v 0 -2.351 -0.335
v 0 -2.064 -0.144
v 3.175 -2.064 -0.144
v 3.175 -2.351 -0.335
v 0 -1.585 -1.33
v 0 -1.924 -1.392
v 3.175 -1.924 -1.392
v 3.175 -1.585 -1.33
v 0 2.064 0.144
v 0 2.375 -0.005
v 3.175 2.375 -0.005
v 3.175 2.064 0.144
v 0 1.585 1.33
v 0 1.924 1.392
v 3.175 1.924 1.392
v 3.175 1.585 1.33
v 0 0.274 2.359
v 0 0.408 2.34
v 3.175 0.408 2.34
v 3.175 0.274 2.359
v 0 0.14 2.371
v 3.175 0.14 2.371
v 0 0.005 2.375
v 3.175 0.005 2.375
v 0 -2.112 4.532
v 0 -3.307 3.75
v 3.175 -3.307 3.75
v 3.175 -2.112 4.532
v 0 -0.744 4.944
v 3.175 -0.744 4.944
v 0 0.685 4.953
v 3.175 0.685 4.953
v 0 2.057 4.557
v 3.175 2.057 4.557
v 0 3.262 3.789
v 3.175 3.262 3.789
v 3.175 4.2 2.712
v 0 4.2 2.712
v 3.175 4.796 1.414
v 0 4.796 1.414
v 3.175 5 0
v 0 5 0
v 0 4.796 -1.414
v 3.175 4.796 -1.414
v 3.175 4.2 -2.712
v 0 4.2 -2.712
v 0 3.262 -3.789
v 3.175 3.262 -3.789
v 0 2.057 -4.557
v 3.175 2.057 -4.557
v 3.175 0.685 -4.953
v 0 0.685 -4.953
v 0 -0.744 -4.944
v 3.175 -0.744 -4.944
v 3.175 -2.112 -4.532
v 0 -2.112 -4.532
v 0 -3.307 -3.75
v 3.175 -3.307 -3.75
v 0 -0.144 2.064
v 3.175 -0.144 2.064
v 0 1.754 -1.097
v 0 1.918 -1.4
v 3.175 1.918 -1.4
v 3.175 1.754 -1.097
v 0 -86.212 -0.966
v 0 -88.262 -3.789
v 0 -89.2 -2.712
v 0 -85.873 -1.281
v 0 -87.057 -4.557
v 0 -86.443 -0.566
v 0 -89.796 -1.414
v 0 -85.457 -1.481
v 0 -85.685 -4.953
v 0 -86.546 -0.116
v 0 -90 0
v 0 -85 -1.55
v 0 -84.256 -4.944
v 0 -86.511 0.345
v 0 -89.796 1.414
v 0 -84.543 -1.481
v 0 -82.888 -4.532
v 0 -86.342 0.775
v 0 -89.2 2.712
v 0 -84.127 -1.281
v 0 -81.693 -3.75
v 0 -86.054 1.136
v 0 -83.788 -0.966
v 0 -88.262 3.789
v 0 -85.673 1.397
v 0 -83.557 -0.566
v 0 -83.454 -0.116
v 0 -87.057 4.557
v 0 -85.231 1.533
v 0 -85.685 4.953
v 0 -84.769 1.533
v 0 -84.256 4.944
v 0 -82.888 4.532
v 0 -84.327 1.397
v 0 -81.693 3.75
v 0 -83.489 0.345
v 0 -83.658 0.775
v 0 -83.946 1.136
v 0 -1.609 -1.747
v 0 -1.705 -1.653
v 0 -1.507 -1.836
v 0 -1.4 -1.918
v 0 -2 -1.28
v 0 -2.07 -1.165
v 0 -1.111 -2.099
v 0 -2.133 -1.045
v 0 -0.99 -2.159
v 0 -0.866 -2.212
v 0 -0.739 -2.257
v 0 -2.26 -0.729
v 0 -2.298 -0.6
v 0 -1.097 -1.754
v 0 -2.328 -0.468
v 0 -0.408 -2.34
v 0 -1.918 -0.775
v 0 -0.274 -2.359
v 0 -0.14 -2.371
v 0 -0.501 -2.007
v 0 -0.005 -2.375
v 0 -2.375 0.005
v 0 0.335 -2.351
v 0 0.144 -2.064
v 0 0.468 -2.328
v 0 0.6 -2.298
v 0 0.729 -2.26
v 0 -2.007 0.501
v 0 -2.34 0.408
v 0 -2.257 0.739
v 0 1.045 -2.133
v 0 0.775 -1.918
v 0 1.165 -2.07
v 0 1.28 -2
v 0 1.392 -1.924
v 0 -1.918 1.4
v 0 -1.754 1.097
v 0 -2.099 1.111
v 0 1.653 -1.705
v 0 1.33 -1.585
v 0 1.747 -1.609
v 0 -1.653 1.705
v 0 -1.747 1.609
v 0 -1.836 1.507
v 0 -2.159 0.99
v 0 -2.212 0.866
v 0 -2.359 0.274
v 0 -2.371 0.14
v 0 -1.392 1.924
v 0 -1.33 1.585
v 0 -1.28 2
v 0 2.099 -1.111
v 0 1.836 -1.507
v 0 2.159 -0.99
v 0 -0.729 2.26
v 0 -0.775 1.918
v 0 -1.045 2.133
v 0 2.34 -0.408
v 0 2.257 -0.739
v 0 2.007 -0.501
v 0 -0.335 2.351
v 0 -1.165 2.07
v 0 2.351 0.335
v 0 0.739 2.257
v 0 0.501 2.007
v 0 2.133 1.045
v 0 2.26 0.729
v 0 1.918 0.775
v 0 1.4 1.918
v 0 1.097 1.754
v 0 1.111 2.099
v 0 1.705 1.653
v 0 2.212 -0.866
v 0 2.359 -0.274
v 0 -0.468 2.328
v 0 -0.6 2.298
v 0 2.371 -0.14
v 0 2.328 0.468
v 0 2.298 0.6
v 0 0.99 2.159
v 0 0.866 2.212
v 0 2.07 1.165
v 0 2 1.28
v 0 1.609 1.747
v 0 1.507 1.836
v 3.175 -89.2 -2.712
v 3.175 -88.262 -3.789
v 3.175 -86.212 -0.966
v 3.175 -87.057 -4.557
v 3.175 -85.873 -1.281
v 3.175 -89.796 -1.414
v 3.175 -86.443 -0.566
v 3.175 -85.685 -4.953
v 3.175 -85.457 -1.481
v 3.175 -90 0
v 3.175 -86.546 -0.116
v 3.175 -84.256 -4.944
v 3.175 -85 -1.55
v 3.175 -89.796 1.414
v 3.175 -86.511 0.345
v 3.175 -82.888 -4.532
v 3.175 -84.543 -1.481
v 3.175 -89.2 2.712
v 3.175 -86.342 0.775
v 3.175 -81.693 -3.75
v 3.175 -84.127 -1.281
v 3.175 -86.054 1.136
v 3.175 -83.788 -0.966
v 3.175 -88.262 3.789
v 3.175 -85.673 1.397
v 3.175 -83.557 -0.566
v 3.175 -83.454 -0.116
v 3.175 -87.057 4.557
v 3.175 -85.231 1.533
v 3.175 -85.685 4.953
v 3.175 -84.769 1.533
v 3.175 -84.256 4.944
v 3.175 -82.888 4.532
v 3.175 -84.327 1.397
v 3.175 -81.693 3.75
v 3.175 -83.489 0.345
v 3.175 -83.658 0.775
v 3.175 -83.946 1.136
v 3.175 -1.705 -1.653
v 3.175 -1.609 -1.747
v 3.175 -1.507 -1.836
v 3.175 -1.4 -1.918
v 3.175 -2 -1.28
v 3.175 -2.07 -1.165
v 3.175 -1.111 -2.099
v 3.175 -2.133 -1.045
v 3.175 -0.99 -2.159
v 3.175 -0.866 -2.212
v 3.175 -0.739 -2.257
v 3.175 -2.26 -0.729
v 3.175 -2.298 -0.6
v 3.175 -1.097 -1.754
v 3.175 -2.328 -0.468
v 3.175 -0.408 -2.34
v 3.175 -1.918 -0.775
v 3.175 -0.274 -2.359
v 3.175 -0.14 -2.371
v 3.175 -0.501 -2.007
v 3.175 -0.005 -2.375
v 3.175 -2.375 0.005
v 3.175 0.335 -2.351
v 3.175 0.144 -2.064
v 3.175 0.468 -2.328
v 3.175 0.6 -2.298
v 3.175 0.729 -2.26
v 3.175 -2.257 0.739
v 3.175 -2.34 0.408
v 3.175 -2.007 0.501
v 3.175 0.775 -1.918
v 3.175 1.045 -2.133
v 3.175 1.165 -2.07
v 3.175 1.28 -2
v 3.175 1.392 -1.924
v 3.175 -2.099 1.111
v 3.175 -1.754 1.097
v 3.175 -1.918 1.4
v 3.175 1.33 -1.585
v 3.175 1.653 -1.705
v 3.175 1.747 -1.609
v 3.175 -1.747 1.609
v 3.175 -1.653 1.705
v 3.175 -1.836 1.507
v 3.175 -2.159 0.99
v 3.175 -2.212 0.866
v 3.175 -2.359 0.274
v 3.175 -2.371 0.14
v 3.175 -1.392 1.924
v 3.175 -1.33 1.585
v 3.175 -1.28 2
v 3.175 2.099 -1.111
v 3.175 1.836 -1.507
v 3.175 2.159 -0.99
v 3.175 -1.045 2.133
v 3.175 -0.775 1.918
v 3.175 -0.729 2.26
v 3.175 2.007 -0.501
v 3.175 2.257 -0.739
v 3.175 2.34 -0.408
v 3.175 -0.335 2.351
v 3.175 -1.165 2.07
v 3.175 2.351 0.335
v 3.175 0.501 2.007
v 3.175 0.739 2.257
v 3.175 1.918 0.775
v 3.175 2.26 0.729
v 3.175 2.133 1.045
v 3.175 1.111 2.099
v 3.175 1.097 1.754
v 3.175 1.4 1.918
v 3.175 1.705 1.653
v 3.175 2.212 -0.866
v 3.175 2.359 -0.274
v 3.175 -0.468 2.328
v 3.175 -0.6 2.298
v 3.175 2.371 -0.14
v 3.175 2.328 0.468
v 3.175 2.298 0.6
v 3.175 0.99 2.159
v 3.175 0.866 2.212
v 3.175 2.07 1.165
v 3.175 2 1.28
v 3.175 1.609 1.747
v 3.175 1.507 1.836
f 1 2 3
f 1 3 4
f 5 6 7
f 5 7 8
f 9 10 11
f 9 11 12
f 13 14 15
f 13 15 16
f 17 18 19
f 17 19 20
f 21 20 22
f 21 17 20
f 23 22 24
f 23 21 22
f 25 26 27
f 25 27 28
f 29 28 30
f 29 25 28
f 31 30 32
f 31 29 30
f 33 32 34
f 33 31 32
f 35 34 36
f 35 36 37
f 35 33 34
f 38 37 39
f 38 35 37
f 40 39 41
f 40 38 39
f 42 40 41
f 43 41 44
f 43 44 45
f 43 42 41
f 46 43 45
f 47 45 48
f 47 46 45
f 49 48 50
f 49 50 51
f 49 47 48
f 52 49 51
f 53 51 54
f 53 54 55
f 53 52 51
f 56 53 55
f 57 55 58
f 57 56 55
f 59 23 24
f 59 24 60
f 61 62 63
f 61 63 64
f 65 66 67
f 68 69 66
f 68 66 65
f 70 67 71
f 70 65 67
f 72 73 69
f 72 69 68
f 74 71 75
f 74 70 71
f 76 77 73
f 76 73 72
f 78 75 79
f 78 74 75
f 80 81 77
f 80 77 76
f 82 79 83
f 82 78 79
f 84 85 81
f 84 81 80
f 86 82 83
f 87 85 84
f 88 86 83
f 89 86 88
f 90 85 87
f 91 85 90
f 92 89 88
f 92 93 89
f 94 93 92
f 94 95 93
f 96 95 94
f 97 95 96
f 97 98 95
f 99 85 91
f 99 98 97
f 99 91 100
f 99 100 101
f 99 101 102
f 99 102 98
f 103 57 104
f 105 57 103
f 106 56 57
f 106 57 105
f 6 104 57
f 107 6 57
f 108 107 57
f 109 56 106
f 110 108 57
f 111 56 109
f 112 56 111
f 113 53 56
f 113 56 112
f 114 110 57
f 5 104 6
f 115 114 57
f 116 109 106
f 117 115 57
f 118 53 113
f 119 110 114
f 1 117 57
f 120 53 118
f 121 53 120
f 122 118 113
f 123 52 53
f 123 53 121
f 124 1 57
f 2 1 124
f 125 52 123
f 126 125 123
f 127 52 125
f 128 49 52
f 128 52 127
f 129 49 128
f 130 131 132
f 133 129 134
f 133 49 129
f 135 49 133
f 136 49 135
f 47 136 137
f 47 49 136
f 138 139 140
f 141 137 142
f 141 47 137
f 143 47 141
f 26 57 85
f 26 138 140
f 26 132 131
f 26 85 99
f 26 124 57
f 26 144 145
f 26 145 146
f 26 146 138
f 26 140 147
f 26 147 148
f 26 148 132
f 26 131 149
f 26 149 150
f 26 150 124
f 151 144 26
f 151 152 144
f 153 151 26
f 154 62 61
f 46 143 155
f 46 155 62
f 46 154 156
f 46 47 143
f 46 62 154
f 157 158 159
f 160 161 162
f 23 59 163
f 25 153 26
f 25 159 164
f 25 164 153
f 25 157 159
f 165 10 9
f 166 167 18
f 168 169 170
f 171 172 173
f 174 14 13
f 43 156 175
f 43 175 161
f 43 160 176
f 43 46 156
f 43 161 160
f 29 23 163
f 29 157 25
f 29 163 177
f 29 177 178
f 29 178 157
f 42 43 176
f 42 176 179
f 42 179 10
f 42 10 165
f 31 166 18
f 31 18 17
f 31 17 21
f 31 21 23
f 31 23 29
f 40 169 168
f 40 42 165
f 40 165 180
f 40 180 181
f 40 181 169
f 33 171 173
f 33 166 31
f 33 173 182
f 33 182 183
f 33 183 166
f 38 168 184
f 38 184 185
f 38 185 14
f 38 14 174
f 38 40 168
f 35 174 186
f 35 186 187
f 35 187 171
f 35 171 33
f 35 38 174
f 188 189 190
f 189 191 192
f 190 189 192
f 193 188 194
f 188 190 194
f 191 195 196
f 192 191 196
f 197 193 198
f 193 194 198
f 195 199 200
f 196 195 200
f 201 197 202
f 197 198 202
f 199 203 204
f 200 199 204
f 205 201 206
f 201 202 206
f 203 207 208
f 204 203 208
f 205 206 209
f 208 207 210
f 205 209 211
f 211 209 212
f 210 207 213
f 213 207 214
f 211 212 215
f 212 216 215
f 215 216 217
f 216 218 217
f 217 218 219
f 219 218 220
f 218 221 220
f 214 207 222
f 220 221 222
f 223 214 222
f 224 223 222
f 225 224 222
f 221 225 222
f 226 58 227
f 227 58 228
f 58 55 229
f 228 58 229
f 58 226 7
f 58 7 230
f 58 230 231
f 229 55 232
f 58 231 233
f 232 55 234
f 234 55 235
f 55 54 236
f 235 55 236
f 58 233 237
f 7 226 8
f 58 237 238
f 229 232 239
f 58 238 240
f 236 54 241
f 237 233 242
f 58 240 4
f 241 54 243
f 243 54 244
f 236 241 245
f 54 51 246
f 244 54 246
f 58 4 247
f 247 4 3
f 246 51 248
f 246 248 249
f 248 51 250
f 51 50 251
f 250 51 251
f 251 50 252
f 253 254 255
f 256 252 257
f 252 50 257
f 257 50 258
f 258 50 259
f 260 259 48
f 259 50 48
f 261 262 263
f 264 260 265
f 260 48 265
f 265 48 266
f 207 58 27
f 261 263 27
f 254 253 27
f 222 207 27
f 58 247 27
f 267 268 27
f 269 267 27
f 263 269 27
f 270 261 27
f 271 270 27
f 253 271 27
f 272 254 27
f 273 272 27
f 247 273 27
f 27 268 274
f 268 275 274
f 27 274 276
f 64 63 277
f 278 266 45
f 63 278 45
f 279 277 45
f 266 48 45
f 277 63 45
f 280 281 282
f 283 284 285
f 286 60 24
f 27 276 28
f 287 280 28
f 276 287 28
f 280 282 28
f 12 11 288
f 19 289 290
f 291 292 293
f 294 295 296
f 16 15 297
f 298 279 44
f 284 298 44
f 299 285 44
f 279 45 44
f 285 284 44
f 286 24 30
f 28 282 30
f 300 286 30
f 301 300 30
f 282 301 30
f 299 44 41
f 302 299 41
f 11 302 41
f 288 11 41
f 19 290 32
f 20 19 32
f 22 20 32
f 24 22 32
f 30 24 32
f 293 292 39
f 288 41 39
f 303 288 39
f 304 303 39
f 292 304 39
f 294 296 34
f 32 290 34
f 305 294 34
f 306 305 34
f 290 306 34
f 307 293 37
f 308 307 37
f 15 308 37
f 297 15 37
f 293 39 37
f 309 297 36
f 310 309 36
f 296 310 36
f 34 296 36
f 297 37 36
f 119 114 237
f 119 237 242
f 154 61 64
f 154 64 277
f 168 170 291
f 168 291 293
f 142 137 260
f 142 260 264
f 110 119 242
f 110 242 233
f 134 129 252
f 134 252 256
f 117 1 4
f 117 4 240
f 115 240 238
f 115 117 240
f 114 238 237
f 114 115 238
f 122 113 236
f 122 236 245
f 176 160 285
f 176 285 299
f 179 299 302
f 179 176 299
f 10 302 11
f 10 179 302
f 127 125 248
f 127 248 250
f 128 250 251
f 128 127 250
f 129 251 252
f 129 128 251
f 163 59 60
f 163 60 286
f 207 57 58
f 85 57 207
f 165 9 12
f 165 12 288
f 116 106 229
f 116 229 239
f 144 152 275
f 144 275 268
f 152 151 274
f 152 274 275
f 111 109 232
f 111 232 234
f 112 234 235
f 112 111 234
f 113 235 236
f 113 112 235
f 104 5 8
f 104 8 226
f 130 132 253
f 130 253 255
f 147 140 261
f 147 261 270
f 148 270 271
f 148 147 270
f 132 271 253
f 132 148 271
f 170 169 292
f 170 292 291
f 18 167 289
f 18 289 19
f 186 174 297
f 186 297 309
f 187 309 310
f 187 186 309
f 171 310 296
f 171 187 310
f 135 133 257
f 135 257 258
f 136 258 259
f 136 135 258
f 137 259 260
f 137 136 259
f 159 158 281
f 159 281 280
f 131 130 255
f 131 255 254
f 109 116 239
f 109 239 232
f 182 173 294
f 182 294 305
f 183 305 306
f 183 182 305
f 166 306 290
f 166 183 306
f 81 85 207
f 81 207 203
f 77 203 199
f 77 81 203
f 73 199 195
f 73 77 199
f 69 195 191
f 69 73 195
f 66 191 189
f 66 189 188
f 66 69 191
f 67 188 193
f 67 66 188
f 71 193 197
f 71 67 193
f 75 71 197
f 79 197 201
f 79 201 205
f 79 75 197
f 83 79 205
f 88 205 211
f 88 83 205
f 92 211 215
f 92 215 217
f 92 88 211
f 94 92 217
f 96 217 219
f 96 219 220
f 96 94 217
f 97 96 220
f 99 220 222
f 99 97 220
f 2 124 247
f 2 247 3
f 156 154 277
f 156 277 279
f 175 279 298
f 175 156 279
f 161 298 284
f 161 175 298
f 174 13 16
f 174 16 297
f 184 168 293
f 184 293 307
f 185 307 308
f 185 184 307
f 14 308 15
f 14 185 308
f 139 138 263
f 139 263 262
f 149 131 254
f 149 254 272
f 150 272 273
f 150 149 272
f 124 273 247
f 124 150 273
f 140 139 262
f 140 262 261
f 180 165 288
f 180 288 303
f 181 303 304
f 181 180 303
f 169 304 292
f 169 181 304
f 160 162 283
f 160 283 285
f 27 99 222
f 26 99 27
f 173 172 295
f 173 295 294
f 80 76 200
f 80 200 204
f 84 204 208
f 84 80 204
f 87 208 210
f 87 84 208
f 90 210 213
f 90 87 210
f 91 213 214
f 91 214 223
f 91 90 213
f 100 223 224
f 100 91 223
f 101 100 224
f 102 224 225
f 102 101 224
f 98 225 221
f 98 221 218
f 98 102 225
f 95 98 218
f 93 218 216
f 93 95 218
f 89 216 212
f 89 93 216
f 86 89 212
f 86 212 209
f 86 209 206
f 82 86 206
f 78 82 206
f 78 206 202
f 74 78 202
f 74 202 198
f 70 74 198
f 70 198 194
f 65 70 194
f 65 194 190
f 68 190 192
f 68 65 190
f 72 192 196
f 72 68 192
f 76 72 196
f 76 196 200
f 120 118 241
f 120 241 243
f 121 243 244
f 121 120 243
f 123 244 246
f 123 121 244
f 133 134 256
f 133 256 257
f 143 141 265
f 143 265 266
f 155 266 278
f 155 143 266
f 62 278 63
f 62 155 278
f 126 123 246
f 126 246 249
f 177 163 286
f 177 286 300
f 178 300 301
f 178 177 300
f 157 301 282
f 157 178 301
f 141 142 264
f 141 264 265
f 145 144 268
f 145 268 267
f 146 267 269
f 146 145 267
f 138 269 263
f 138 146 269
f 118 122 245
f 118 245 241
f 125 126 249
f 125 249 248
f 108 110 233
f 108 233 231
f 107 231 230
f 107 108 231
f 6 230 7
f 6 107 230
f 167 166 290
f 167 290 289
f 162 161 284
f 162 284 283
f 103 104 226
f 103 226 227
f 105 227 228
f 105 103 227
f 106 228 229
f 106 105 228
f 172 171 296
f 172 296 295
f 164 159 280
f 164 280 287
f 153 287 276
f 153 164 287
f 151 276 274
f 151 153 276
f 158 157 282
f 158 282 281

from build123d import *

# Parameters (mm, degrees)
SKETCH1_R           = 1.55
BOSS_EXTRUDE3_DEPTH = 3.175


with BuildPart() as part:
    # Sketch1 → Boss-Extrude3 (new body)
    with BuildSketch(Plane(origin=(0, 0, 0), x_dir=(0, 0, -1), z_dir=(1, 0, 0))):
        with BuildLine():
            Line((3.75, -3.307189139), (3.75, -81.692810861))
            ThreePointArc((3.75, -81.692810861), (0, -90), (-3.75, -81.692810861))
            Line((-3.75, -81.692810861), (-3.75, -3.307189139))
            ThreePointArc((-3.75, -3.307189139), (0, 5), (3.75, -3.307189139))
        make_face()
        with Locations((0, -85)):
            Circle(SKETCH1_R, mode=Mode.SUBTRACT)
        with BuildLine():
            Line((-1.754399331, 1.096511265), (-2.099123622, 1.110992809))
            ThreePointArc((-2.099123622, 1.110992809), (-2.186107384, 0.928202298), (-2.257209306, 0.738668497))
            Line((-2.257209306, 0.738668497), (-2.007373532, 0.500704976))
            Line((-2.007373532, 0.500704976), (-2.339700857, 0.407952078))
            ThreePointArc((-2.339700857, 0.407952078), (-2.365941957, 0.207228511), (-2.374994738, 0.004999452))
            Line((-2.374994738, 0.004999452), (-2.063852025, -0.144113805))
            Line((-2.063852025, -0.144113805), (-2.351251872, -0.335021845))
            ThreePointArc((-2.351251872, -0.335021845), (-2.314181647, -0.534030246), (-2.260299137, -0.729158975))
            Line((-2.260299137, -0.729158975), (-1.918306302, -0.774825723))
            Line((-1.918306302, -0.774825723), (-2.13264597, -1.045201495))
            ThreePointArc((-2.13264597, -1.045201495), (-2.035893114, -1.223014403), (-1.924349708, -1.39194224))
            Line((-1.924349708, -1.39194224), (-1.584983392, -1.329692301))
            Line((-1.584983392, -1.329692301), (-1.705281823, -1.65306954))
            ThreePointArc((-1.705281823, -1.65306954), (-1.558317177, -1.792281388), (-1.400031522, -1.918472501))
            Line((-1.400031522, -1.918472501), (-1.096511265, -1.754399331))
            Line((-1.096511265, -1.754399331), (-1.110992809, -2.099123622))
            ThreePointArc((-1.110992809, -2.099123622), (-0.928202298, -2.186107384), (-0.738668497, -2.257209306))
            Line((-0.738668497, -2.257209306), (-0.500704976, -2.007373532))
            Line((-0.500704976, -2.007373532), (-0.407952078, -2.339700857))
            ThreePointArc((-0.407952078, -2.339700857), (-0.207228511, -2.365941957), (-0.004999452, -2.374994738))
            Line((-0.004999452, -2.374994738), (0.144113805, -2.063852025))
            Line((0.144113805, -2.063852025), (0.335021845, -2.351251872))
            ThreePointArc((0.335021845, -2.351251872), (0.534030246, -2.314181647), (0.729158975, -2.260299137))
            Line((0.729158975, -2.260299137), (0.774825723, -1.918306302))
            Line((0.774825723, -1.918306302), (1.045201495, -2.13264597))
            ThreePointArc((1.045201495, -2.13264597), (1.223014403, -2.035893114), (1.39194224, -1.924349708))
            Line((1.39194224, -1.924349708), (1.329692301, -1.584983392))
            Line((1.329692301, -1.584983392), (1.65306954, -1.705281823))
            ThreePointArc((1.65306954, -1.705281823), (1.792281388, -1.558317177), (1.918472501, -1.400031522))
            Line((1.918472501, -1.400031522), (1.754399331, -1.096511265))
            Line((1.754399331, -1.096511265), (2.099123622, -1.110992809))
            ThreePointArc((2.099123622, -1.110992809), (2.186107384, -0.928202298), (2.257209306, -0.738668497))
            Line((2.257209306, -0.738668497), (2.007373532, -0.500704976))
            Line((2.007373532, -0.500704976), (2.339700857, -0.407952078))
            ThreePointArc((2.339700857, -0.407952078), (2.365941957, -0.207228511), (2.374994738, -0.004999452))
            Line((2.374994738, -0.004999452), (2.063852025, 0.144113805))
            Line((2.063852025, 0.144113805), (2.351251872, 0.335021845))
            ThreePointArc((2.351251872, 0.335021845), (2.314181647, 0.534030246), (2.260299137, 0.729158975))
            Line((2.260299137, 0.729158975), (1.918306302, 0.774825723))
            Line((1.918306302, 0.774825723), (2.13264597, 1.045201495))
            ThreePointArc((2.13264597, 1.045201495), (2.035893114, 1.223014403), (1.924349708, 1.39194224))
            Line((1.924349708, 1.39194224), (1.584983392, 1.329692301))
            Line((1.584983392, 1.329692301), (1.705281823, 1.65306954))
            ThreePointArc((1.705281823, 1.65306954), (1.558317177, 1.792281388), (1.400031522, 1.918472501))
            Line((1.400031522, 1.918472501), (1.096511265, 1.754399331))
            Line((1.096511265, 1.754399331), (1.110992809, 2.099123622))
            ThreePointArc((1.110992809, 2.099123622), (0.928202298, 2.186107384), (0.738668497, 2.257209306))
            Line((0.738668497, 2.257209306), (0.500704976, 2.007373532))
            Line((0.500704976, 2.007373532), (0.407952078, 2.339700857))
            ThreePointArc((0.407952078, 2.339700857), (0.207228511, 2.365941957), (0.004999452, 2.374994738))
            Line((0.004999452, 2.374994738), (-0.144113805, 2.063852025))
            Line((-0.144113805, 2.063852025), (-0.335021845, 2.351251872))
            ThreePointArc((-0.335021845, 2.351251872), (-0.534030246, 2.314181647), (-0.729158975, 2.260299137))
            Line((-0.729158975, 2.260299137), (-0.774825723, 1.918306302))
            Line((-0.774825723, 1.918306302), (-1.045201495, 2.13264597))
            ThreePointArc((-1.045201495, 2.13264597), (-1.223014403, 2.035893114), (-1.39194224, 1.924349708))
            Line((-1.39194224, 1.924349708), (-1.329692301, 1.584983392))
            Line((-1.329692301, 1.584983392), (-1.65306954, 1.705281823))
            ThreePointArc((-1.65306954, 1.705281823), (-1.792281388, 1.558317177), (-1.918472501, 1.400031522))
            Line((-1.918472501, 1.400031522), (-1.754399331, 1.096511265))
        make_face(mode=Mode.SUBTRACT)
    extrude(amount=BOSS_EXTRUDE3_DEPTH)


solid = part.part
